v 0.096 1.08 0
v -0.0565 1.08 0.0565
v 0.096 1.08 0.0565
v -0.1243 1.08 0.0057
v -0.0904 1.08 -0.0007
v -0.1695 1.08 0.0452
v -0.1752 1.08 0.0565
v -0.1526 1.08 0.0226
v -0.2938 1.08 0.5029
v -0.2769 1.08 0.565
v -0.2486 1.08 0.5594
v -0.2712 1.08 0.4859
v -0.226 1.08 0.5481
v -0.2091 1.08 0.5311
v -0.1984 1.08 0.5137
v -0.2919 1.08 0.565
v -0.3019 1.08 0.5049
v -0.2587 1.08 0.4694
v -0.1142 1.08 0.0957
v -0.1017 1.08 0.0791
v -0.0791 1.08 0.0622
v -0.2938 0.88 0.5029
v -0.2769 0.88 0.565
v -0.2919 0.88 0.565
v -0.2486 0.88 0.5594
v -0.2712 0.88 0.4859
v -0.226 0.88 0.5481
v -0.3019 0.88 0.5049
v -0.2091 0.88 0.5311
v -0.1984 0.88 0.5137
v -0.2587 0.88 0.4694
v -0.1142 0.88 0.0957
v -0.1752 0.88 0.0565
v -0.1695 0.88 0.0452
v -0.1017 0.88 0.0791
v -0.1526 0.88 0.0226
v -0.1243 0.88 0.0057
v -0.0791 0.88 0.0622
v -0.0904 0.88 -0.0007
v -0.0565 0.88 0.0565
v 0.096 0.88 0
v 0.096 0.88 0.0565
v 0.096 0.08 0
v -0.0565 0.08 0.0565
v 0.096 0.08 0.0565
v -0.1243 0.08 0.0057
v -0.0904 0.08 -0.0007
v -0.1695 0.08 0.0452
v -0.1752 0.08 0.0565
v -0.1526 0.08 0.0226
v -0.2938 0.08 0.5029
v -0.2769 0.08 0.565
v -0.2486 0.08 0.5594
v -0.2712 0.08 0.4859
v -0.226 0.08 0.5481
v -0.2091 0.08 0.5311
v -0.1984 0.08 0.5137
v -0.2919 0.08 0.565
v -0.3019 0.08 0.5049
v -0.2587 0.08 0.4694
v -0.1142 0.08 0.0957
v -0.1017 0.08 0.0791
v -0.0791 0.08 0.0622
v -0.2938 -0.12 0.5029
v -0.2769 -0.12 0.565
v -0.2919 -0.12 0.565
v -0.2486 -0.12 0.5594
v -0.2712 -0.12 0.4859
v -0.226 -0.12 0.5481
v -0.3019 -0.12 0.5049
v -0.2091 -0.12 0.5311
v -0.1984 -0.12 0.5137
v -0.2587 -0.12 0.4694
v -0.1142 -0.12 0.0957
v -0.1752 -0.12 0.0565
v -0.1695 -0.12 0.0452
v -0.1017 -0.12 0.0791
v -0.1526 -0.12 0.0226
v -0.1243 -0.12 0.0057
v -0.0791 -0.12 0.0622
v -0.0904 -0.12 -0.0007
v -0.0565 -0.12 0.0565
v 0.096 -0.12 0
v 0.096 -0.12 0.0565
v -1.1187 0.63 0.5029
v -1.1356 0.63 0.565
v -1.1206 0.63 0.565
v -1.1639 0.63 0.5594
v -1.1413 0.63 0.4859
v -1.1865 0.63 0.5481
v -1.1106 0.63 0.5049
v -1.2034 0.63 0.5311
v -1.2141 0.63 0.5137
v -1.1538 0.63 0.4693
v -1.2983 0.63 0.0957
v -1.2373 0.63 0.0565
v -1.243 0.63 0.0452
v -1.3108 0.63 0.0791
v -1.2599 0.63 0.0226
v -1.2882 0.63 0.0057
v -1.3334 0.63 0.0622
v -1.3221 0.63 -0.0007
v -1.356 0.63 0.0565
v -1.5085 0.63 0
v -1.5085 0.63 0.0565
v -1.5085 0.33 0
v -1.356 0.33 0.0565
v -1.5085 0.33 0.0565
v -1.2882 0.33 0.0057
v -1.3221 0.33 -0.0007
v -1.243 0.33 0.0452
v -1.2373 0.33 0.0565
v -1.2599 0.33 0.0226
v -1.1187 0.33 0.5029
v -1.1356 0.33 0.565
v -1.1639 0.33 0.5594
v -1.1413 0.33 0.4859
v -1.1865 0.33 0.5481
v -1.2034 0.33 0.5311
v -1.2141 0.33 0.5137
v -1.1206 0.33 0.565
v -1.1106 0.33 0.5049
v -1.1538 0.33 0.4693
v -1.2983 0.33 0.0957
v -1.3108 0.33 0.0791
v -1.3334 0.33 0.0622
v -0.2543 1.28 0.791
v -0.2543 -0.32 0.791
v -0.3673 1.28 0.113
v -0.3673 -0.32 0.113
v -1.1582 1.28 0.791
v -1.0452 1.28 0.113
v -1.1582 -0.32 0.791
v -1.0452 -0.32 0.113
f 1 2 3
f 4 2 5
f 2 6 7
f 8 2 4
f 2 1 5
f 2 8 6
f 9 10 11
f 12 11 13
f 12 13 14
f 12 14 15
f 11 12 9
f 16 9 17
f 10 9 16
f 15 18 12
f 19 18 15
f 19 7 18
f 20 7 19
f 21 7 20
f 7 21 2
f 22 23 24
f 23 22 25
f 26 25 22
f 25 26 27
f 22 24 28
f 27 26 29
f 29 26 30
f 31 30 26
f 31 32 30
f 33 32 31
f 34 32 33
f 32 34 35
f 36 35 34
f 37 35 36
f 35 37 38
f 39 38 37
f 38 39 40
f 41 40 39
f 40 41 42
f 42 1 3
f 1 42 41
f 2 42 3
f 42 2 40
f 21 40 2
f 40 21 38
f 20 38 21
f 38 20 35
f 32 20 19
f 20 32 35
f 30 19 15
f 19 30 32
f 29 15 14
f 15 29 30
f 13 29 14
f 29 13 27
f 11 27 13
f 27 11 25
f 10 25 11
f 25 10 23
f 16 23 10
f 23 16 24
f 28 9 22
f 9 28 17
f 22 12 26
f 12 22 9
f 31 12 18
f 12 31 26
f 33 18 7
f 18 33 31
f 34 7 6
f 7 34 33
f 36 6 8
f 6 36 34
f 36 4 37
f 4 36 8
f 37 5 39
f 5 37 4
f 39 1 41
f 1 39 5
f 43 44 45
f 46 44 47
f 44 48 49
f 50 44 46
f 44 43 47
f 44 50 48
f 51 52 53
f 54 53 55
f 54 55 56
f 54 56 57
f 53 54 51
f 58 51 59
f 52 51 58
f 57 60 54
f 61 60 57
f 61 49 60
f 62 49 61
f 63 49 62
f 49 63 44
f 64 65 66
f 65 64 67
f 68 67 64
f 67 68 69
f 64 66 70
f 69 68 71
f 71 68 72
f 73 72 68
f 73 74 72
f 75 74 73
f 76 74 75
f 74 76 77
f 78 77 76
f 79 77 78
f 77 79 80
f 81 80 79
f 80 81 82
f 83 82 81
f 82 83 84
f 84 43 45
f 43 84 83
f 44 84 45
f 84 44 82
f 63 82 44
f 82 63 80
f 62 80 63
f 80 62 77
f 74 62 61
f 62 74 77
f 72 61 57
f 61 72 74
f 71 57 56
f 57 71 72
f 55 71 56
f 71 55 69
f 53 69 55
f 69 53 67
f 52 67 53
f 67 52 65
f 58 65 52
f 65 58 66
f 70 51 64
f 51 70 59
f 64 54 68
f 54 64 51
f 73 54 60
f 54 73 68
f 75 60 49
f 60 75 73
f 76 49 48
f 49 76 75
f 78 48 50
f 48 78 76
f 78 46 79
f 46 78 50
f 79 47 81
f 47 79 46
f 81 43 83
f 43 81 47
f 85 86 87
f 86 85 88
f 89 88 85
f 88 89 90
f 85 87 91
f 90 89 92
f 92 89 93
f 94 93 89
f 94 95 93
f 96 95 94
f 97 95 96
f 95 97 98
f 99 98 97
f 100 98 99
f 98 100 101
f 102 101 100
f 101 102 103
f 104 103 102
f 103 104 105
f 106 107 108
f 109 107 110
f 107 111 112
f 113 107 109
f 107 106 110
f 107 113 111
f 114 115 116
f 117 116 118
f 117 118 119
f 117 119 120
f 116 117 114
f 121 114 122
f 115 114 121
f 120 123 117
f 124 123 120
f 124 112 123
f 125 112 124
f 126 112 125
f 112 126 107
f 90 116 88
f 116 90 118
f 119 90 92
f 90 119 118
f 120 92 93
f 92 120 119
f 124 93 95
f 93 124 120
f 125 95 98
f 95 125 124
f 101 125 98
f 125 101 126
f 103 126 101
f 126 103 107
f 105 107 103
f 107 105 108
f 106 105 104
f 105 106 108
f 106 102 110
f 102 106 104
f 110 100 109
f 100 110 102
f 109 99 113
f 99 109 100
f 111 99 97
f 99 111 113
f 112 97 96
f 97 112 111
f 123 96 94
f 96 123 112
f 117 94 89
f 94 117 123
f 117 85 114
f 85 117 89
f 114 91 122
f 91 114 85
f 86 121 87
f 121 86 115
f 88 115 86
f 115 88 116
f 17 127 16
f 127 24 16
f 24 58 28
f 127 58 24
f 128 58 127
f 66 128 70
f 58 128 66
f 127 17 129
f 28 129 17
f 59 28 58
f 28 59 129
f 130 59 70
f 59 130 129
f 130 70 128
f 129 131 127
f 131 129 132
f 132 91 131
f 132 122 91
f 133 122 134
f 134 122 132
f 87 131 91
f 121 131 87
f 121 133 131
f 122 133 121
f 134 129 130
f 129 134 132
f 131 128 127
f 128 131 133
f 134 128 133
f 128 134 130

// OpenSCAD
// Model for SC90 package
//
// Copyright (C) 2017,2020 Tibor 'Igor2' Palinkas
// Copyright (C) 2023 Erich Heinzle
//
// File distribution license:
//  This library is free software; you can redistribute it and/or
//  modify it under the terms of the GNU Lesser General Public
//  License as published by the Free Software Foundation; either
//  version 2.1 of the License, or (at your option) any later version.
//
//  This library is distributed in the hope that it will be useful,
//  but WITHOUT ANY WARRANTY; without even the implied warranty of
//  MERCHANTABILITY or FITNESS FOR A PARTICULAR PURPOSE.  See the GNU
//  Lesser General Public License for more details.
//
//  You should have received a copy of the GNU Lesser General Public
//  License along with this library; if not, write to the Free Software
//  Foundation, Inc., 51 Franklin Street, Fifth Floor, Boston, MA  02110-1301  USA
//
// The above distribution license applies when the file is distributed as a
// stand alone model file or as part of a library, in both cases intended
// for reuse combined by the user with other openscad scripts.
//
// Use license:
//  as a special exception, the content of the file may be
//  embedded in an openscad script that represents a printed circuit board,
//  for example when a board is exported by pcb-rnd. In such use case,
//  the content of this file may be copied into the resulting board file
//  with or without modifications, without affecting the board file's license
//  in any way.
//

module sc90()
{
	module sc90_()
	{
		// pin prototype
		module pin(length, height, thick)
		{
			linear_extrude(height=thick)
				scale([length, -2*height, 1])
					polygon([[0.3400,0.0000],[0.3900,0.0100],[0.4300,0.0300],[0.4600,0.0600],[0.4789,0.0908],[0.6279,0.8307],[0.6500,0.8600],[0.6900,0.8900],[0.7300,0.9000],[1.0000,0.9000],[1.0000,1.0000],[0.6700,1.0012],[0.6100,0.9900],[0.5600,0.9600],[0.5300,0.9200],[0.5200,0.9000],[0.3721,0.1693],[0.3500,0.1400],[0.3100,0.1100],[0.2700,0.1000],[0.0000,0.1000],[0.0000,0.0000]]);
		}

		rotate([90,0,-90]) scale([1.13,1.13,1.0]) translate([-0.625, 0.0, -1.28]) {
			// body
			color([0.1,0.1,0.1])
				linear_extrude(height=1.6)
					polygon([[-0.3,0.1],[-0.4,0.7],[0.4,0.7],[0.3,0.1]]);

			// 6 pins
			color([0.9, 0.9, 0.9]) {
				translate([0.21,0.5,0.3-0.2/2])
					pin(0.5, 0.25, 0.2);
				translate([0.21,0.5,1.3-0.2/2])
					pin(0.5, 0.25, 0.2);

				translate([-0.21,0.5,0.8-0.3/2])
					pin(-0.5, 0.25, 0.3);

			}
		}
	}

	// match rotation with stock footprint's
	rotate([0,0,90])
		sc90_();
}
sc90();
